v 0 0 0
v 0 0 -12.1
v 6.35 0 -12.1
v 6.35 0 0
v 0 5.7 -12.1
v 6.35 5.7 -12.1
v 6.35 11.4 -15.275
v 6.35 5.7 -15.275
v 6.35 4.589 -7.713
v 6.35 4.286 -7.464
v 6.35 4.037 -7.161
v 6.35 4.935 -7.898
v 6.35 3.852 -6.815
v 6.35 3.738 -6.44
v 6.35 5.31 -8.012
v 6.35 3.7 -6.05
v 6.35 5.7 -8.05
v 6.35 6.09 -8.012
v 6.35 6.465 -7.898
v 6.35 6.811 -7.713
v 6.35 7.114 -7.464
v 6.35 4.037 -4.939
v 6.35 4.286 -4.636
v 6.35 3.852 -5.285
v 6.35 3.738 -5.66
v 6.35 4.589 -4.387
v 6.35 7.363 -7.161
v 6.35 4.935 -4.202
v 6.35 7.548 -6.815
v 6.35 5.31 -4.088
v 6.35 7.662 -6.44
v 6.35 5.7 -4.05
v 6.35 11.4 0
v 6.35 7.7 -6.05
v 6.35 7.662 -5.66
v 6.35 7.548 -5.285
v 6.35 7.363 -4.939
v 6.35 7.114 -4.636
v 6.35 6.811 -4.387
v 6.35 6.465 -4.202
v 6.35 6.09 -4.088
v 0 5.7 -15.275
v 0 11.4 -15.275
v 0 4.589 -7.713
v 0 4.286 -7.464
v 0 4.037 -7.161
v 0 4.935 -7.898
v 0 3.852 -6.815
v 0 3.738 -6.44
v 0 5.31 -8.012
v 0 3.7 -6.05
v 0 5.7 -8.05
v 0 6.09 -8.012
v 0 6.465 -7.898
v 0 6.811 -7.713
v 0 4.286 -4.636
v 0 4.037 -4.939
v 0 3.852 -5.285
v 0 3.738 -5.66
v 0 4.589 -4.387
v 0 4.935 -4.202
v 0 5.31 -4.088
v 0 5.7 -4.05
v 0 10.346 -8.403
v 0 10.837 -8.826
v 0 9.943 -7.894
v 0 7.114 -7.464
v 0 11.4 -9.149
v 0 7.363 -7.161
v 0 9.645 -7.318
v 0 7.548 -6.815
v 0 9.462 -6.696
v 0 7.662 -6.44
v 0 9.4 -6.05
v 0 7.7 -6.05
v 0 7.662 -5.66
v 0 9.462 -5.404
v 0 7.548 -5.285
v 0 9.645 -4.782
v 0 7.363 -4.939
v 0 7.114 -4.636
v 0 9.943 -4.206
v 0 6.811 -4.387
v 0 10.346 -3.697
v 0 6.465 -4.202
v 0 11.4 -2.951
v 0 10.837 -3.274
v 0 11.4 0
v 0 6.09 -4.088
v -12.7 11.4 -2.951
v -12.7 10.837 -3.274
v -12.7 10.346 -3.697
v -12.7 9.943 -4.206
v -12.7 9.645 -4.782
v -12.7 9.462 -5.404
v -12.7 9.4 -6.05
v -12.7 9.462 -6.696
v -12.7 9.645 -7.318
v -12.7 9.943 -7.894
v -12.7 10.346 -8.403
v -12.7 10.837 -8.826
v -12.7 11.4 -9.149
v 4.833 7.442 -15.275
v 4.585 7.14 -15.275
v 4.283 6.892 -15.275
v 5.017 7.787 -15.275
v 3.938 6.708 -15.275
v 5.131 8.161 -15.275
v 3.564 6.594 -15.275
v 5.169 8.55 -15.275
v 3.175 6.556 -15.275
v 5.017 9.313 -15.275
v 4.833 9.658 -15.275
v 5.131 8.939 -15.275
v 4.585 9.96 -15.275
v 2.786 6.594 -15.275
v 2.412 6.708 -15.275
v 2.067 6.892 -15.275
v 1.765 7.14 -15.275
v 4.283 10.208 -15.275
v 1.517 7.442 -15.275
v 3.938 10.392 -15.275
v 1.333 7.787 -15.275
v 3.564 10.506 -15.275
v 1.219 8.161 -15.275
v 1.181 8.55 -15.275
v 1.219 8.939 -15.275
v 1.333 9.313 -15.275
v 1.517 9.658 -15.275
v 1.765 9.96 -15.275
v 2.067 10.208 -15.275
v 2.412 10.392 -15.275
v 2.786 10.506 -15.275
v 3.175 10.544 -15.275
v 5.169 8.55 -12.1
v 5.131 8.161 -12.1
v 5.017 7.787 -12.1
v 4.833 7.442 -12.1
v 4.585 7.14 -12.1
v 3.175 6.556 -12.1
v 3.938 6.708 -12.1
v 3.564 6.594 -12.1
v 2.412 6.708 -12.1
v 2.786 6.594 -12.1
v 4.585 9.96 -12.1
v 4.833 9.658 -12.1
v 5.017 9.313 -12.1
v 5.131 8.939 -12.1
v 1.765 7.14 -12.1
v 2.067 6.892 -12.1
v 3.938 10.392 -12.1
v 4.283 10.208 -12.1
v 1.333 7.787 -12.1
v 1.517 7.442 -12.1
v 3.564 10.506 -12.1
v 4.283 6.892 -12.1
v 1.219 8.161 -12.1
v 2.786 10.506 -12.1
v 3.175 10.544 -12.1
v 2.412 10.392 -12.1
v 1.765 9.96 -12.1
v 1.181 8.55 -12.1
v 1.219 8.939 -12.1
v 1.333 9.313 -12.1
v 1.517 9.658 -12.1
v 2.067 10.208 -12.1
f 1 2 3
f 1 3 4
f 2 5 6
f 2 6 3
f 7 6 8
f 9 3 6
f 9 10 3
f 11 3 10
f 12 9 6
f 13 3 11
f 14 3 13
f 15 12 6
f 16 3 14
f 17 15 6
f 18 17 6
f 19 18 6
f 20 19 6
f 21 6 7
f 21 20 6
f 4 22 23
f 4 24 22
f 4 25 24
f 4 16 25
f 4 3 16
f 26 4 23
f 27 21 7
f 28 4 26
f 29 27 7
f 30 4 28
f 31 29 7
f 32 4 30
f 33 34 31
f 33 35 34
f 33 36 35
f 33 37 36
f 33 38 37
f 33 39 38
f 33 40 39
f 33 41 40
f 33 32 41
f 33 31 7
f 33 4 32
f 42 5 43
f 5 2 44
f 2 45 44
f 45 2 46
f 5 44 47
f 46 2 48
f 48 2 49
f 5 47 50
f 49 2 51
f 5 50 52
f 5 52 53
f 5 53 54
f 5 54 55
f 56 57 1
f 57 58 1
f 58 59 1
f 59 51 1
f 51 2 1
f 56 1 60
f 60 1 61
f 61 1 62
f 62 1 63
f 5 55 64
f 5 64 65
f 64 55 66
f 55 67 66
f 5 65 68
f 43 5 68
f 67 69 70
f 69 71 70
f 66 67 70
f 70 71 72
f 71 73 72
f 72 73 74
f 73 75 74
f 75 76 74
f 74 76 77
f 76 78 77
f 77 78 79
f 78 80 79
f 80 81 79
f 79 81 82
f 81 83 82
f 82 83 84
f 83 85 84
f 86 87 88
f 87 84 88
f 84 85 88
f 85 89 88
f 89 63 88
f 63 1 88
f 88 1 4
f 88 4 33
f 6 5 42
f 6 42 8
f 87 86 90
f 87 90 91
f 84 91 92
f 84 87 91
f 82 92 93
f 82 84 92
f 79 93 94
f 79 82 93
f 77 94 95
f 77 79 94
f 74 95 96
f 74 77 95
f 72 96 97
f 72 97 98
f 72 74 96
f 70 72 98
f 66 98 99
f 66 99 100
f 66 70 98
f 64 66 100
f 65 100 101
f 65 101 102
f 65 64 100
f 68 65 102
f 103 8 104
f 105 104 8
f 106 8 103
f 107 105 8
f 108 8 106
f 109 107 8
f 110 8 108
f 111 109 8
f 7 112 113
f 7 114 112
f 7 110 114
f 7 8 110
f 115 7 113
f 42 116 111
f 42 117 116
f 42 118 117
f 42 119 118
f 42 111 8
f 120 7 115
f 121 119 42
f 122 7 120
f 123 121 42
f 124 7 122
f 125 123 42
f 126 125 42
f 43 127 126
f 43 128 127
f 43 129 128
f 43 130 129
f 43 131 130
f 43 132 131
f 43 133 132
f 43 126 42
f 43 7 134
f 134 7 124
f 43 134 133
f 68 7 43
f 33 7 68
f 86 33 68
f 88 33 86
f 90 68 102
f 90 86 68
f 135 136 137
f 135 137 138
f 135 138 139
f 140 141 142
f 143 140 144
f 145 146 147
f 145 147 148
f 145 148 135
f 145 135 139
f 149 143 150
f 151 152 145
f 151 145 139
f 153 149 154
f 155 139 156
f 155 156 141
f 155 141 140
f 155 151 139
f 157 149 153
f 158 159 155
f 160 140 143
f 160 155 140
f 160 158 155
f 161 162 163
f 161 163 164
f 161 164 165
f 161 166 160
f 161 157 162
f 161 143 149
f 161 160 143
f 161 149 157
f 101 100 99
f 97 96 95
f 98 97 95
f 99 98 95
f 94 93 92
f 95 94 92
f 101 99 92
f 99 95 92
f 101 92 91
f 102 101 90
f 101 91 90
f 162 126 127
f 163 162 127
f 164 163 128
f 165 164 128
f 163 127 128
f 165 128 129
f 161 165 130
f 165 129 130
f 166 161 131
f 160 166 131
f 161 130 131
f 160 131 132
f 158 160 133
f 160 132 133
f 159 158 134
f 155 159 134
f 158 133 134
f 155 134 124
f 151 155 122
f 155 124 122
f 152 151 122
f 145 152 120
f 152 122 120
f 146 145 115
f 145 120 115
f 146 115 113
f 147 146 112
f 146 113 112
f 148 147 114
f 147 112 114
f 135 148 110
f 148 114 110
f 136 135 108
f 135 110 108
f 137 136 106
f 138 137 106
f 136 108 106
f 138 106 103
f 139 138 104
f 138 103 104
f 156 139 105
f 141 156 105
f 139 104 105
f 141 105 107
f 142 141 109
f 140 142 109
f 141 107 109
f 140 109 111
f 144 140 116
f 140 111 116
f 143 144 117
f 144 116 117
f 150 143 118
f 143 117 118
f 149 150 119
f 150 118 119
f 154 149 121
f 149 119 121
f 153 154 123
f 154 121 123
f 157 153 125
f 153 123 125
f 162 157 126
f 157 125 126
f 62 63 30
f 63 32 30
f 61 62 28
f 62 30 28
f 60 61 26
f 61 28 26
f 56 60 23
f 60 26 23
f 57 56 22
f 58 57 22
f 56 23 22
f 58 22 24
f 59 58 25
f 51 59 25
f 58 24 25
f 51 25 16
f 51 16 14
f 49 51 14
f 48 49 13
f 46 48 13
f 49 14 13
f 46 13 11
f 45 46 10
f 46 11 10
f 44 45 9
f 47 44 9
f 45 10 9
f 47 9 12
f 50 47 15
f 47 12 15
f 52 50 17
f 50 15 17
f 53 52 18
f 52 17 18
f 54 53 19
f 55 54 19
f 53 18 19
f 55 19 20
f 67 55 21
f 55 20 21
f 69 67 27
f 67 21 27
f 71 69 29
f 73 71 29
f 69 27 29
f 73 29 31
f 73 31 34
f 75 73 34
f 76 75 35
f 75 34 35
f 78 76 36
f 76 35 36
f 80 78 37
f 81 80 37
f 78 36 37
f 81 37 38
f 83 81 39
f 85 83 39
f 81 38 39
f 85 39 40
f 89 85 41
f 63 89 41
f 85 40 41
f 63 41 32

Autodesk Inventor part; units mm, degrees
ref_plane "YZ Plane" through (0, 0, 0) normal (1, 0, 0) x (0, 1, 0)
ref_plane "XZ Plane" through (0, 0, 0) normal (0, 1, 0) x (-1, 0, 0)
ref_plane "XY Plane" through (0, 0, 0) normal (0, 0, 1) x (1, 0, 0)
sketch "Sketch1" plane through (0, 0, 0) normal (1, 0, 0) x (0, 1, 0)
  line L0 (0, 0) -> (11.4, 0)
  line L1 (11.4, 0) -> (11.4, -12.1)
  line L2 (11.4, -12.1) -> (0, -12.1)
  line L3 (0, -12.1) -> (0, 0)
  arc A0 (11.4, -2.9512) -> (11.4, -9.1488) centre (12.8006, -6.05) ccw
  point P0 (3.5, -5)
  dimension "d0" = 11.4
  dimension "d1" = 12.1
  dimension "d2" = 6.1976
  dimension "d3" = 2.9512
  dimension "d29" = 2
extrude "Extrusion1" add sketch "Sketch1" along normal blind 6.35
extrude "Extrusion2" add sketch "Sketch1" against normal blind 12.7 contours L1 A0
sketch "Sketch3" plane through (0, 0, 0) normal (-1, 0, 0) x (0, 0, 1)
  line L0 (0, 11.4) -> (0, 0) projected
  line L1 (0, 0) -> (-12.1, 0) projected
  point P0 (-6.05, 5.7)
  dimension "d19" = 12.1
  dimension "d20" = 6.05
  dimension "d30" = 11.4
  dimension "d31" = 5.7
hole "Hole2" at (0, 5.7, -6.05) direction (1, 0, 0) diameter 4 end through all
sketch "Sketch9" plane through (0, 0, -12.1) normal (0, 0, -1) x (-1, 0, 0)
  line L0 (-6.35, 0) -> (-6.35, 11.4) projected
  line L1 (0, 0) -> (0, 11.4) projected
  line L2 (-6.35, 11.4) -> (0, 11.4)
  line L3 (0, 11.4) -> (0, 5.7)
  line L4 (0, 5.7) -> (-6.35, 5.7)
  line L5 (-6.35, 5.7) -> (-6.35, 11.4)
  dimension "d70" = 11.4
  dimension "d71" = 5.7
extrude "Extrusion10" add sketch "Sketch9" along normal blind 3.175
sketch "Sketch10" plane through (0, 0, -15.275) normal (0, 0, -1) x (-1, 0, 0)
  circle A0 centre (-3.175, 8.55) radius 1.9939
  line L0 (-6.35, 11.4) -> (-6.35, 5.7) projected
  line L1 (0, 11.4) -> (-6.35, 11.4) projected
  point P0 (0, 0)
  dimension "d74" = 6.35
  dimension "d75" = 5.7
  dimension "d76" = 2.85
  dimension "d77" = 3.175
  dimension "d80" = 3.9878
extrude "Extrusion11" cut sketch "Sketch10" against normal up to surface (3.175 mm away)
thread "Thread3" size "M4x0.7" class "6H" standard "ISO Metric profile" full length
equation "\"d3\" = -0.5 * d2 + 0.5 * d1"
equation "\"d20\" = 0.5 * d19"
equation "\"d31\" = 0.5 * d30"
equation "\"d71\" = 0.5 * d70"
equation "\"d76\" = 0.5 * d75"
equation "\"d77\" = 0.5 * d74"
properties part number "end peice for slides"
